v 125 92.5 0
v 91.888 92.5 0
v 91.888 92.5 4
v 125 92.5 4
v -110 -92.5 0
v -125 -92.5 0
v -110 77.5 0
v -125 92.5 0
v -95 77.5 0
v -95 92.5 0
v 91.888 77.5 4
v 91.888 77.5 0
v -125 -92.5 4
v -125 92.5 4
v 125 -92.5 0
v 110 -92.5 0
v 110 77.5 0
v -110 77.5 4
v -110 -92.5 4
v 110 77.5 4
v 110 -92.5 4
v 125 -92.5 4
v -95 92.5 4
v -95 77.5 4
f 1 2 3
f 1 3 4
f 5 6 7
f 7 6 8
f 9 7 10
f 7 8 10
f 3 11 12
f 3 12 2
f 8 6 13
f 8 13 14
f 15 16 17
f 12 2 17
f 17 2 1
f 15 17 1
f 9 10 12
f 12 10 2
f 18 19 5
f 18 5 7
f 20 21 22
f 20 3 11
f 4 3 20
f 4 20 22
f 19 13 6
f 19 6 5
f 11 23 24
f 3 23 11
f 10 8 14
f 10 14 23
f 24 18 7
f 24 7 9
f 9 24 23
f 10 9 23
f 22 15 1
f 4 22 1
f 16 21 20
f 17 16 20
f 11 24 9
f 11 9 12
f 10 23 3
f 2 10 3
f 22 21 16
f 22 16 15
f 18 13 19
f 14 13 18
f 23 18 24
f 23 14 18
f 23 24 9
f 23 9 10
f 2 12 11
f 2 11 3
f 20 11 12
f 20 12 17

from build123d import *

# Parameters (mm, degrees)
SKETCH1_W           = 250
SKETCH1_H           = 185
BOSS_EXTRUDE1_DEPTH = 4
SKETCH2_W           = 186.887727078
SKETCH2_H           = 152.5
CUT_EXTRUDE2_DEPTH  = 10
SKETCH3_W           = 186.887727078
SKETCH3_H           = 32.5
BOSS_EXTRUDE2_DEPTH = 4
SKETCH4_W           = 186.887727078
SKETCH4_H           = 32.5
CUT_EXTRUDE3_DEPTH  = 4
SKETCH5_W           = 186.887727078
SKETCH5_H           = 30
BOSS_EXTRUDE3_DEPTH = 4
SKETCH6_W           = 220
SKETCH6_H           = 170
CUT_EXTRUDE5_DEPTH  = 4
SKETCH7_W           = 186.887727078
SKETCH7_H           = 15
CUT_EXTRUDE6_DEPTH  = 4


with BuildPart() as part:
    # Sketch1 → Boss-Extrude1 (new body)
    with BuildSketch(Plane.XY):
        Rectangle(SKETCH1_W, SKETCH1_H)
    extrude(amount=BOSS_EXTRUDE1_DEPTH)

    # Sketch2 → Cut-Extrude2 (cut)
    with BuildSketch(Plane(origin=(0, 0, 0), x_dir=(-1, 0, 0), z_dir=(0, 0, -1))):
        with Locations((1.556136461, -16.25)):
            Rectangle(SKETCH2_W, SKETCH2_H)
    extrude(amount=-CUT_EXTRUDE2_DEPTH, mode=Mode.SUBTRACT)

    # Sketch3 → Boss-Extrude2 (add)
    with BuildSketch(Plane.XY.offset(4)):
        with Locations((-1.556136461, -76.25)):
            Rectangle(SKETCH3_W, SKETCH3_H)
    extrude(amount=-BOSS_EXTRUDE2_DEPTH)

    # Sketch4 → Cut-Extrude3 (cut)
    with BuildSketch(Plane.XY.offset(4)):
        with Locations((-1.556136461, 76.25)):
            Rectangle(SKETCH4_W, SKETCH4_H)
    extrude(amount=-CUT_EXTRUDE3_DEPTH, mode=Mode.SUBTRACT)

    # Sketch6 → Cut-Extrude5 (cut)
    with BuildSketch(Plane.XY.offset(4)):
        with Locations((0, -7.5)):
            Rectangle(SKETCH6_W, SKETCH6_H)
    extrude(amount=-CUT_EXTRUDE5_DEPTH, mode=Mode.SUBTRACT)


with BuildPart() as body_2:
    # Sketch5 → Boss-Extrude3 (new body)
    with BuildSketch(Plane.XY.offset(4)):
        with Locations((-1.556136461, 77.5)):
            Rectangle(SKETCH5_W, SKETCH5_H)
    extrude(amount=-BOSS_EXTRUDE3_DEPTH)

    # Sketch7 → Cut-Extrude6 (cut)
    with BuildSketch(Plane.XY.offset(4)):
        with Locations((-1.556136461, 70)):
            Rectangle(SKETCH7_W, SKETCH7_H)
    extrude(amount=-CUT_EXTRUDE6_DEPTH, mode=Mode.SUBTRACT)


with BuildPart() as cut_extrude5_piece_1:
    # of the separate pieces the step leaves, piece 1, a body of its own (cut_extrude5_pieces)
    add(part.part.solids().sort_by_distance((110, -92.5, 0))[0])


with BuildPart() as cut_extrude5_piece_2:
    # of the separate pieces the step leaves, piece 2, a body of its own (cut_extrude5_pieces)
    add(part.part.solids().sort_by_distance((-125, -92.5, 0))[0])


solid = Compound([body_2.part, cut_extrude5_piece_1.part, cut_extrude5_piece_2.part])
